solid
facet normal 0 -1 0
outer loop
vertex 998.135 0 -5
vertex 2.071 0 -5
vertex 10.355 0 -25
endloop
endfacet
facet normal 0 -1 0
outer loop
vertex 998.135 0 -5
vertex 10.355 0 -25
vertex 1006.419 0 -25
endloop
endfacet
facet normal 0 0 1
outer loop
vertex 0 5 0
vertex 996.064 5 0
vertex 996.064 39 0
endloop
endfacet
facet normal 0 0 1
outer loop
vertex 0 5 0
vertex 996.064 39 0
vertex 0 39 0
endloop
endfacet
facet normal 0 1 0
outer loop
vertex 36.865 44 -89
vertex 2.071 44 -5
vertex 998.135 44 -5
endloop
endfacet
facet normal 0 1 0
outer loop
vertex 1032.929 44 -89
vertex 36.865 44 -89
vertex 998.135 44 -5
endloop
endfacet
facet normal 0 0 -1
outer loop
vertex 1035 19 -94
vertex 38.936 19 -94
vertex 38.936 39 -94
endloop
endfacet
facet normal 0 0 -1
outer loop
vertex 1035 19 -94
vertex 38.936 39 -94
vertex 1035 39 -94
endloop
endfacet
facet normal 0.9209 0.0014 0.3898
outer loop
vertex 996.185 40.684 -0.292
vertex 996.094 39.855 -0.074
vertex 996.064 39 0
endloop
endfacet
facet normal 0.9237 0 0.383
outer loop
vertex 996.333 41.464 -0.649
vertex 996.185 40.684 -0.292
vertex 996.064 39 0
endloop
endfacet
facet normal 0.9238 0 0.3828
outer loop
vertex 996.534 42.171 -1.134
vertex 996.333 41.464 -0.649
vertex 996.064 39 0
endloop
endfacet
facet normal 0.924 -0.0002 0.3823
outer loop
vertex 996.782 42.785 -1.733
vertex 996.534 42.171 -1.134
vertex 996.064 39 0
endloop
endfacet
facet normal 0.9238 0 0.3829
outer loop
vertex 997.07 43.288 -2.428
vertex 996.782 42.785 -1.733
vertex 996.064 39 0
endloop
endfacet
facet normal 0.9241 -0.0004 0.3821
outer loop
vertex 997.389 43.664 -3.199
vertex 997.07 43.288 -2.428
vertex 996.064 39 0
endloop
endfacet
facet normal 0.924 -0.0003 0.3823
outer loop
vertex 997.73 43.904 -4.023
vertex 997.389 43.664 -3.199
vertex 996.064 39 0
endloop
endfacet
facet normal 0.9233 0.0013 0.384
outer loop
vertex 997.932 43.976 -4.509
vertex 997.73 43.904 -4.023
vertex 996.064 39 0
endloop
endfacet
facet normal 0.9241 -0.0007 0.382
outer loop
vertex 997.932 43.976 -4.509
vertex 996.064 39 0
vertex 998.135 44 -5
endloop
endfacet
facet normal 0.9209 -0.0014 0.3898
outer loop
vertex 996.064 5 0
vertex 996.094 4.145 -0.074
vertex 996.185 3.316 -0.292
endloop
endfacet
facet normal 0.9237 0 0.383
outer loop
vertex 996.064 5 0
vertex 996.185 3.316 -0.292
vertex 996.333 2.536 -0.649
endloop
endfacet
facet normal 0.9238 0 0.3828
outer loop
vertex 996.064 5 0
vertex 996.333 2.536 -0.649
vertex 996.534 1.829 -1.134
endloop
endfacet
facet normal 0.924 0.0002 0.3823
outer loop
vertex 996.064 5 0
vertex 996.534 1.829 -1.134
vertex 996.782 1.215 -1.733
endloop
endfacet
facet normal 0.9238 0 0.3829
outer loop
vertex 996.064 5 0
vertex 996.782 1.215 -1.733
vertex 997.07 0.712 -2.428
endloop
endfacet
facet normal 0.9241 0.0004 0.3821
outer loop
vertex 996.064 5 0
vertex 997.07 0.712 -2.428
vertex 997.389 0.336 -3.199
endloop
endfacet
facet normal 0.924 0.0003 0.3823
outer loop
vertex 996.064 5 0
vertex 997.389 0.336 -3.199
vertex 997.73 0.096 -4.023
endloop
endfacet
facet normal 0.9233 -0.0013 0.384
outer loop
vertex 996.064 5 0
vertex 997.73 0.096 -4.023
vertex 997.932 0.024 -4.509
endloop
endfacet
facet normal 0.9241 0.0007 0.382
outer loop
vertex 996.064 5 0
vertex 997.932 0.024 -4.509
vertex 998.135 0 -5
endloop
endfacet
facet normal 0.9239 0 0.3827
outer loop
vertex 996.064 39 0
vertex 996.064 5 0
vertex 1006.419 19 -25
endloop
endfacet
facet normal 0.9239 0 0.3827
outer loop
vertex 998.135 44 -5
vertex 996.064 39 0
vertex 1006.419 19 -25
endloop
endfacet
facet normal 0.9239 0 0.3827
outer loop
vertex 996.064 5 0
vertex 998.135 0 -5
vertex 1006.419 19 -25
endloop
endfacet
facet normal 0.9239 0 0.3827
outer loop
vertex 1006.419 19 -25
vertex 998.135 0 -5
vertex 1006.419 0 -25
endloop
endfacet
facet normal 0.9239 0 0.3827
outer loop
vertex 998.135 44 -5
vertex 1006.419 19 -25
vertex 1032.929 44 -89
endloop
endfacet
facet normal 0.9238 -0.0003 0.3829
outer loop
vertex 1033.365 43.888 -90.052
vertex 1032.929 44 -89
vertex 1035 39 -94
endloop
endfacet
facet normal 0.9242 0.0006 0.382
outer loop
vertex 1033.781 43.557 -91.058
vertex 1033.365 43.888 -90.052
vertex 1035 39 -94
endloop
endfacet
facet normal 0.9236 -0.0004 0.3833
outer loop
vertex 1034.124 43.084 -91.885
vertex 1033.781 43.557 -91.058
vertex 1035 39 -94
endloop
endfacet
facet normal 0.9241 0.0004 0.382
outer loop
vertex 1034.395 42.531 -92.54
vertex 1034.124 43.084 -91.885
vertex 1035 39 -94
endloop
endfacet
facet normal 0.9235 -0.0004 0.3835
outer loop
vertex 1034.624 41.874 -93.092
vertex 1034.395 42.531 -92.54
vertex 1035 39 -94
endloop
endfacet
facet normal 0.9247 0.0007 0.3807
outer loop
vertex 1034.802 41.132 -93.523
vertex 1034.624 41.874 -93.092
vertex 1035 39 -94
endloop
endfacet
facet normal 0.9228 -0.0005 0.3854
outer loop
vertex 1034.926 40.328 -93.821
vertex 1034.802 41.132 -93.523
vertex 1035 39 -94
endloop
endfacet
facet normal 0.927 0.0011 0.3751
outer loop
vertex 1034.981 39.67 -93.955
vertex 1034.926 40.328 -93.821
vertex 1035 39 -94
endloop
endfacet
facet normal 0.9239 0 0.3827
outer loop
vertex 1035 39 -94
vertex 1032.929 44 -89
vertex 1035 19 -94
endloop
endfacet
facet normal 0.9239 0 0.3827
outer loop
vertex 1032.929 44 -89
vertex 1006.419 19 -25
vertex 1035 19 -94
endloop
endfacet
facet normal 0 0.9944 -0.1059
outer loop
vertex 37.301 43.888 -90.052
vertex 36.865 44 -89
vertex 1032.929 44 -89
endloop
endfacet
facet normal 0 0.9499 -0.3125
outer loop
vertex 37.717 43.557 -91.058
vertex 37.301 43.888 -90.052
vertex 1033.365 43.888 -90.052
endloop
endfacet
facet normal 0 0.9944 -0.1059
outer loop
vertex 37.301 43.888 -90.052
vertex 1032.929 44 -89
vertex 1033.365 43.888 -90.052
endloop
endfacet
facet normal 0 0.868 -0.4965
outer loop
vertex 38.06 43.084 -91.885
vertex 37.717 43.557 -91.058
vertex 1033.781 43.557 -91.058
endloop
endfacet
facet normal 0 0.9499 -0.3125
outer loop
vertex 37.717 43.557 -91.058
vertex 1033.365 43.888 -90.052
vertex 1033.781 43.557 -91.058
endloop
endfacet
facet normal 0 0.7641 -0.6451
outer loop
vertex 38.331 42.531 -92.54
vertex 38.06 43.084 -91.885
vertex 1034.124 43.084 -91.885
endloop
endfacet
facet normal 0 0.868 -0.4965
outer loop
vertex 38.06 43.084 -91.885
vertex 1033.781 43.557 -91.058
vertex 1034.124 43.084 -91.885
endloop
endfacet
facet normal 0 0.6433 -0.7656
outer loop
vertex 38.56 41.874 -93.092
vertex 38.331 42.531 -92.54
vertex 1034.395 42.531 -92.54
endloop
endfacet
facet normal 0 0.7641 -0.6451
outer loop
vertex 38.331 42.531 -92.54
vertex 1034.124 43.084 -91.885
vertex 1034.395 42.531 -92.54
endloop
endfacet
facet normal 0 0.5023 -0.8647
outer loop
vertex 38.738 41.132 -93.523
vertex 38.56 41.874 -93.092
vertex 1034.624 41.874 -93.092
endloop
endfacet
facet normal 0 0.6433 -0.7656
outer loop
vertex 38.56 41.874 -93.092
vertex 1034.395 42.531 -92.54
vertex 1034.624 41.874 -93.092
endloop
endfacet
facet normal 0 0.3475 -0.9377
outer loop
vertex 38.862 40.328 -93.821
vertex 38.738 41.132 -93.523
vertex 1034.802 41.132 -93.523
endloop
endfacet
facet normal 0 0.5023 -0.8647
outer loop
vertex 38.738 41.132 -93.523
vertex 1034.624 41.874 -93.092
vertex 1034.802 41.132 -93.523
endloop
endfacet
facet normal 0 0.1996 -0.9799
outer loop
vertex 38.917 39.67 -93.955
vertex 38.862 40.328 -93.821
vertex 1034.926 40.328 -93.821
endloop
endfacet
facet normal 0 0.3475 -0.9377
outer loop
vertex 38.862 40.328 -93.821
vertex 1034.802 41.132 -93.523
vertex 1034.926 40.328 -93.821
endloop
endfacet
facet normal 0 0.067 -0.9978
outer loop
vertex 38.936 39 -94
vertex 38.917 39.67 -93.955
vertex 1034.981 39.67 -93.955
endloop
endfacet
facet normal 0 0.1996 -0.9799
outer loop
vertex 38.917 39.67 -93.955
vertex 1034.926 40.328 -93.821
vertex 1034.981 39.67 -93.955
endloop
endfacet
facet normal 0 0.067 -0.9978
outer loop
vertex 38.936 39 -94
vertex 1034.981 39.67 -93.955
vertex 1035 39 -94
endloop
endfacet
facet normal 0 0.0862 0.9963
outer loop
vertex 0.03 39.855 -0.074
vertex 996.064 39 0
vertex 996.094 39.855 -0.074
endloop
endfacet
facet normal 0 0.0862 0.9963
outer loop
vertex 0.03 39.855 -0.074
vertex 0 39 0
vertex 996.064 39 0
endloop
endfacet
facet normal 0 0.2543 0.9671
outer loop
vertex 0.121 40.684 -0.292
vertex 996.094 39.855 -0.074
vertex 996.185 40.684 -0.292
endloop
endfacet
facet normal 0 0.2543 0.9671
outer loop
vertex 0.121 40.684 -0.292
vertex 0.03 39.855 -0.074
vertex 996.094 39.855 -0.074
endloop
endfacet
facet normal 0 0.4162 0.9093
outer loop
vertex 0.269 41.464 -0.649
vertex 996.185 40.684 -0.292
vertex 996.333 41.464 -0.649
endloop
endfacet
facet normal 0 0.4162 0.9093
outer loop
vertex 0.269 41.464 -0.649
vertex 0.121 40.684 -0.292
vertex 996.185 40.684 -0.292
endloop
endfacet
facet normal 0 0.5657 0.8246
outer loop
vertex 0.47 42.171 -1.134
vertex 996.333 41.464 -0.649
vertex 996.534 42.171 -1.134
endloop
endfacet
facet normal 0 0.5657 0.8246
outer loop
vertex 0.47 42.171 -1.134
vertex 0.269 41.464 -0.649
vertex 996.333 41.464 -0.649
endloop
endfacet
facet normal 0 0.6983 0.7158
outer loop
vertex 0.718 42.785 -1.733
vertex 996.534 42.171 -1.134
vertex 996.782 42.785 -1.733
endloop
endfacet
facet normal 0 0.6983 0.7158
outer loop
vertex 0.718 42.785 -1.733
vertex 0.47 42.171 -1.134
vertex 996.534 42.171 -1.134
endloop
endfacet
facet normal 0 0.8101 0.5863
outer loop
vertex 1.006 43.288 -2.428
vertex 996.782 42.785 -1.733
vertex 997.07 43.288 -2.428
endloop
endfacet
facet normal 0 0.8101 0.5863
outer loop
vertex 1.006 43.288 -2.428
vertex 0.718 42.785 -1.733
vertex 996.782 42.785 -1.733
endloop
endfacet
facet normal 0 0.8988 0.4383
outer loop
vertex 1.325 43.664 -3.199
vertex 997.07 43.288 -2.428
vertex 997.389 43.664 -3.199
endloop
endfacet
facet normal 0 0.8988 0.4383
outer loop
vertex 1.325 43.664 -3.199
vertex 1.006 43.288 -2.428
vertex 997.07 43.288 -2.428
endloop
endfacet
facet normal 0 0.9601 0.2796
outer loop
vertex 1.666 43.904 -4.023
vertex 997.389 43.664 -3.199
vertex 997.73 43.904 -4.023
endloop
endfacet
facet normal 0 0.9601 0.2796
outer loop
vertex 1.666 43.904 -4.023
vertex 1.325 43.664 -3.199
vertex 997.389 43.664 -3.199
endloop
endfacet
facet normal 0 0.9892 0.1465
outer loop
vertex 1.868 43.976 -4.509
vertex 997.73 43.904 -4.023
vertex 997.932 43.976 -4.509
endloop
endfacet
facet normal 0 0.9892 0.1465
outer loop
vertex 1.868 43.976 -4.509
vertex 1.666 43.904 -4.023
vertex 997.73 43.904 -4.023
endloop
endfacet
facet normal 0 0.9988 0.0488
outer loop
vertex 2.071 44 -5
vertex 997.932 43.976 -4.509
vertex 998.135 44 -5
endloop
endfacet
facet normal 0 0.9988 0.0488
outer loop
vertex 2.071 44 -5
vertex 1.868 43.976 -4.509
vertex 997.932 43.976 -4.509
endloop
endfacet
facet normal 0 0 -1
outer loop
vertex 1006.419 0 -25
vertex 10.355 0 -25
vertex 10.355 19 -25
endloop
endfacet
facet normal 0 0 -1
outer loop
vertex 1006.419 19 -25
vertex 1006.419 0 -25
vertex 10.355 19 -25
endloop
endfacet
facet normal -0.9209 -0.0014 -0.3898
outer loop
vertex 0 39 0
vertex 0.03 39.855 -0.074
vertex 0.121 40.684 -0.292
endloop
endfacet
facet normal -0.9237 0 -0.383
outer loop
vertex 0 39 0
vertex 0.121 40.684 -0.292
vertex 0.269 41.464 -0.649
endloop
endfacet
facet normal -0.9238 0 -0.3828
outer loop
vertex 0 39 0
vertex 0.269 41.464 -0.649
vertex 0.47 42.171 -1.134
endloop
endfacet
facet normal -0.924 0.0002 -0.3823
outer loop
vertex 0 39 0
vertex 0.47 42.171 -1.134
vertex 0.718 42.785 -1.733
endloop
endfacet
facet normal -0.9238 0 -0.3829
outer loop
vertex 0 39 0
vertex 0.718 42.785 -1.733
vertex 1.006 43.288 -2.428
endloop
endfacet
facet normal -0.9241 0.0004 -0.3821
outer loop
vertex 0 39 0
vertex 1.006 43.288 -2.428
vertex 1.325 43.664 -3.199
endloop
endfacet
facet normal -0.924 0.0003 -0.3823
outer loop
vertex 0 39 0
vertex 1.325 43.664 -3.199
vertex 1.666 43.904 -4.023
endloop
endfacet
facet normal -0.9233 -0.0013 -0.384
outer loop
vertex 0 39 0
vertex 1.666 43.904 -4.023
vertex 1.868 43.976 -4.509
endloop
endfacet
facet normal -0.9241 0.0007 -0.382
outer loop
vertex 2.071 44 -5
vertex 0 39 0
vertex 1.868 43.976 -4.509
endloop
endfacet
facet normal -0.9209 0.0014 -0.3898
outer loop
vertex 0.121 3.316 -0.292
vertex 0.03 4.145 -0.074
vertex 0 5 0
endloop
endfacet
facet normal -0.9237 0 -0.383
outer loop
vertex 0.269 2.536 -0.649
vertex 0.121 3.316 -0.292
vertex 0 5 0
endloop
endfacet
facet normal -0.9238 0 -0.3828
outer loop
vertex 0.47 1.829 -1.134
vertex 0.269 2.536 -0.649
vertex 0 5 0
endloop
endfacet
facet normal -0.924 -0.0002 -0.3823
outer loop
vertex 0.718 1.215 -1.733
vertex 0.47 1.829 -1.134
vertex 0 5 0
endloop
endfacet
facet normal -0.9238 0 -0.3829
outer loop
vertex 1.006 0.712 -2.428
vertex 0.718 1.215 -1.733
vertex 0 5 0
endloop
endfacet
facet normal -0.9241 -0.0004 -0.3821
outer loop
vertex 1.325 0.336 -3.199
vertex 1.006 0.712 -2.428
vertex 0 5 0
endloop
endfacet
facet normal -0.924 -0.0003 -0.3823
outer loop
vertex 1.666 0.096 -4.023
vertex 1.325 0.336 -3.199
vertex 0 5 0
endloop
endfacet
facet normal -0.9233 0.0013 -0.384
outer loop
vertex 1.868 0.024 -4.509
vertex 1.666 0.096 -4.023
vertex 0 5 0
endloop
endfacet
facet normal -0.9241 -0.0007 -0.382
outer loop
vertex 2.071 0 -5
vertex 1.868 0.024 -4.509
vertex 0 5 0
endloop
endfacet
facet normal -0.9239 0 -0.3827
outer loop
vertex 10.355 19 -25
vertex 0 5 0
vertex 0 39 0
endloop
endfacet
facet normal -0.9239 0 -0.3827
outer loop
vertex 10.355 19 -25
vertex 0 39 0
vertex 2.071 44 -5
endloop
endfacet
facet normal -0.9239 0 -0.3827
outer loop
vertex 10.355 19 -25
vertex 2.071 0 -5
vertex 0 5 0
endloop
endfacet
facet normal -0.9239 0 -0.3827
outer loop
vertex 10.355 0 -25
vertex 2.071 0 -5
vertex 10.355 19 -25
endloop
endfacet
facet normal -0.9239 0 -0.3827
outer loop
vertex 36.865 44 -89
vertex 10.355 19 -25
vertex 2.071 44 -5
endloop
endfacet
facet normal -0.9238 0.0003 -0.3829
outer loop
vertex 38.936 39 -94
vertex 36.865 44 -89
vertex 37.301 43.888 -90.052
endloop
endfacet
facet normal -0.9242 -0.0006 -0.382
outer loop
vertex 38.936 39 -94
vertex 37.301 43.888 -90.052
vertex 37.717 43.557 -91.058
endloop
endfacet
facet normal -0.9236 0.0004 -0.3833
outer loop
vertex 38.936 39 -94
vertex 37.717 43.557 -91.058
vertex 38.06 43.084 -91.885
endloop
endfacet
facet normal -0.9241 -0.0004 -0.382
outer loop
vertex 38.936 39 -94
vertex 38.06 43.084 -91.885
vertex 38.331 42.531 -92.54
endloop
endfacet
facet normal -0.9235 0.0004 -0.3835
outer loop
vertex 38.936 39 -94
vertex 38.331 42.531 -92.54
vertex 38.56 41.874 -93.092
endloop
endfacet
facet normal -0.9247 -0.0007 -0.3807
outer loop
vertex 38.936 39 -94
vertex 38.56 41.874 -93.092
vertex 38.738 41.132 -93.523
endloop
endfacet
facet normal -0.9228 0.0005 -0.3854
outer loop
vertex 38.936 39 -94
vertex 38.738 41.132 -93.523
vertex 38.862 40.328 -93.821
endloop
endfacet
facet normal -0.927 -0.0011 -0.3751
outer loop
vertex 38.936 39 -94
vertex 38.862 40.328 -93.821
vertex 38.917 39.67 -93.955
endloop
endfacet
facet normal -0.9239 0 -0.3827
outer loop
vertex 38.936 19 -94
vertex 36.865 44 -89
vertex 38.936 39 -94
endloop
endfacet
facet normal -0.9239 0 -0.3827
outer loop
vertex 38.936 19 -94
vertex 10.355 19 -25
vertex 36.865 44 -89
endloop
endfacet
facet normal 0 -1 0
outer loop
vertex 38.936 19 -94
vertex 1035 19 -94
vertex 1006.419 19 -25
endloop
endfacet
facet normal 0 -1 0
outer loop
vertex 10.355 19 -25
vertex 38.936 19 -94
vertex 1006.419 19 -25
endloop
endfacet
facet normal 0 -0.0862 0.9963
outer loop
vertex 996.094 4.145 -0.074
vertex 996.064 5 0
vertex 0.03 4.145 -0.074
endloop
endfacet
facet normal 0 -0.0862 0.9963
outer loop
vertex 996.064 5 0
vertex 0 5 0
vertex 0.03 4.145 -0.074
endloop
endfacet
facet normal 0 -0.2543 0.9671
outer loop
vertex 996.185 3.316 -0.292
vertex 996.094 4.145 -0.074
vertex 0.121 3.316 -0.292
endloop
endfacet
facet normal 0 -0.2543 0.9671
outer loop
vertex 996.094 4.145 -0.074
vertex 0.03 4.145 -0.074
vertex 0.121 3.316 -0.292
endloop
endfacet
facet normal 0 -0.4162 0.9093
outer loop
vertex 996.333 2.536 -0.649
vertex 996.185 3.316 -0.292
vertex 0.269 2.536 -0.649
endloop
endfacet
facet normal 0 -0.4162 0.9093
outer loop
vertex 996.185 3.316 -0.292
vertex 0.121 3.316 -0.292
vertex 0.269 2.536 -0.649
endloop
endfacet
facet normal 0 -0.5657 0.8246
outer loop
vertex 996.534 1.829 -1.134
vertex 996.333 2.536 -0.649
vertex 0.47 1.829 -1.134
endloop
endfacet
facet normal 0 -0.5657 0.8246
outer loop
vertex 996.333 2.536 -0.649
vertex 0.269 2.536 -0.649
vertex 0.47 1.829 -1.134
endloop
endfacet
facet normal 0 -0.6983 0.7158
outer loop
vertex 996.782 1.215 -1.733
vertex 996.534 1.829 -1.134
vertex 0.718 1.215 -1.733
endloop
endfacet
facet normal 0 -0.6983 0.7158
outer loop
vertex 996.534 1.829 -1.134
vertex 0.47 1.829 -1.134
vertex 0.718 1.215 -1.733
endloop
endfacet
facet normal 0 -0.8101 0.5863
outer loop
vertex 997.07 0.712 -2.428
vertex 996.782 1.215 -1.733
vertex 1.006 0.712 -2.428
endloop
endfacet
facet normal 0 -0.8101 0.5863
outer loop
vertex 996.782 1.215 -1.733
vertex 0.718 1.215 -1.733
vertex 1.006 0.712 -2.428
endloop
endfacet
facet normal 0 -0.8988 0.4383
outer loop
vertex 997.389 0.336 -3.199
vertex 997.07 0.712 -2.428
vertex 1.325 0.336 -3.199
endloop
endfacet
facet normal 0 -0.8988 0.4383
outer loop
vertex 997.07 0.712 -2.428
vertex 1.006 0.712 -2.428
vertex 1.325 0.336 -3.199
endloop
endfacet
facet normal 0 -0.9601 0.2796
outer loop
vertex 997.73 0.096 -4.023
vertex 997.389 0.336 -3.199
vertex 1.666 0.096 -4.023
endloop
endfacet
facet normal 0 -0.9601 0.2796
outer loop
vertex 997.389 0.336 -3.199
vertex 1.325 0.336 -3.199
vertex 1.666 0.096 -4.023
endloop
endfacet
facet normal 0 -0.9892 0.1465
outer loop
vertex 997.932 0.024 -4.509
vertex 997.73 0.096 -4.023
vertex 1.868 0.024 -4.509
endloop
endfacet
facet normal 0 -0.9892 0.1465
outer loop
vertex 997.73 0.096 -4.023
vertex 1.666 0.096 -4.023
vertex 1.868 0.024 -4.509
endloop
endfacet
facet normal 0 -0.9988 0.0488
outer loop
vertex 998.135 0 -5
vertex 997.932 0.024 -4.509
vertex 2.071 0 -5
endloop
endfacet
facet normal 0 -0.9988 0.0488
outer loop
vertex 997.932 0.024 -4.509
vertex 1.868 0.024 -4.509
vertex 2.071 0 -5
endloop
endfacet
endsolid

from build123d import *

# Parameters (mm, degrees)
F1_DEPTH = 44
F3_W     = 19
F3_H     = 69
F4_DEPTH = 1035.001
F5_DEPTH = 44.001
F6_R     = 5


with BuildPart() as f1:
    # F0 (on Front) → F1 (new body)
    with BuildSketch(Plane.XZ):
        Polygon((1035, 0), (0, 0), (38.936075, -94), (1035, -94), align=None)
    extrude(amount=-F1_DEPTH)

    # F3 (on face) → F4 (cut, through all)
    with BuildSketch(Plane.YZ.offset(1035)):
        with Locations((9.5, -59.5)):
            Rectangle(F3_W, F3_H)
    extrude(amount=-F4_DEPTH, mode=Mode.SUBTRACT)

    # F2 (on face) → F5 (cut, through all)
    with BuildSketch(Plane.XZ):
        Polygon((996.063925, 0), (1035, -94), (1035, 0), align=None)
    extrude(amount=-F5_DEPTH, mode=Mode.SUBTRACT)

    # F6
    f6_edges = [f1.edges().sort_by_distance(p)[0] for p in [
        (498.031963, 0, 0),
        (498.031963, 44, 0),
        (536.968037, 44, -94),
    ]]
    fillet(f6_edges, radius=F6_R)


solid = f1.part
